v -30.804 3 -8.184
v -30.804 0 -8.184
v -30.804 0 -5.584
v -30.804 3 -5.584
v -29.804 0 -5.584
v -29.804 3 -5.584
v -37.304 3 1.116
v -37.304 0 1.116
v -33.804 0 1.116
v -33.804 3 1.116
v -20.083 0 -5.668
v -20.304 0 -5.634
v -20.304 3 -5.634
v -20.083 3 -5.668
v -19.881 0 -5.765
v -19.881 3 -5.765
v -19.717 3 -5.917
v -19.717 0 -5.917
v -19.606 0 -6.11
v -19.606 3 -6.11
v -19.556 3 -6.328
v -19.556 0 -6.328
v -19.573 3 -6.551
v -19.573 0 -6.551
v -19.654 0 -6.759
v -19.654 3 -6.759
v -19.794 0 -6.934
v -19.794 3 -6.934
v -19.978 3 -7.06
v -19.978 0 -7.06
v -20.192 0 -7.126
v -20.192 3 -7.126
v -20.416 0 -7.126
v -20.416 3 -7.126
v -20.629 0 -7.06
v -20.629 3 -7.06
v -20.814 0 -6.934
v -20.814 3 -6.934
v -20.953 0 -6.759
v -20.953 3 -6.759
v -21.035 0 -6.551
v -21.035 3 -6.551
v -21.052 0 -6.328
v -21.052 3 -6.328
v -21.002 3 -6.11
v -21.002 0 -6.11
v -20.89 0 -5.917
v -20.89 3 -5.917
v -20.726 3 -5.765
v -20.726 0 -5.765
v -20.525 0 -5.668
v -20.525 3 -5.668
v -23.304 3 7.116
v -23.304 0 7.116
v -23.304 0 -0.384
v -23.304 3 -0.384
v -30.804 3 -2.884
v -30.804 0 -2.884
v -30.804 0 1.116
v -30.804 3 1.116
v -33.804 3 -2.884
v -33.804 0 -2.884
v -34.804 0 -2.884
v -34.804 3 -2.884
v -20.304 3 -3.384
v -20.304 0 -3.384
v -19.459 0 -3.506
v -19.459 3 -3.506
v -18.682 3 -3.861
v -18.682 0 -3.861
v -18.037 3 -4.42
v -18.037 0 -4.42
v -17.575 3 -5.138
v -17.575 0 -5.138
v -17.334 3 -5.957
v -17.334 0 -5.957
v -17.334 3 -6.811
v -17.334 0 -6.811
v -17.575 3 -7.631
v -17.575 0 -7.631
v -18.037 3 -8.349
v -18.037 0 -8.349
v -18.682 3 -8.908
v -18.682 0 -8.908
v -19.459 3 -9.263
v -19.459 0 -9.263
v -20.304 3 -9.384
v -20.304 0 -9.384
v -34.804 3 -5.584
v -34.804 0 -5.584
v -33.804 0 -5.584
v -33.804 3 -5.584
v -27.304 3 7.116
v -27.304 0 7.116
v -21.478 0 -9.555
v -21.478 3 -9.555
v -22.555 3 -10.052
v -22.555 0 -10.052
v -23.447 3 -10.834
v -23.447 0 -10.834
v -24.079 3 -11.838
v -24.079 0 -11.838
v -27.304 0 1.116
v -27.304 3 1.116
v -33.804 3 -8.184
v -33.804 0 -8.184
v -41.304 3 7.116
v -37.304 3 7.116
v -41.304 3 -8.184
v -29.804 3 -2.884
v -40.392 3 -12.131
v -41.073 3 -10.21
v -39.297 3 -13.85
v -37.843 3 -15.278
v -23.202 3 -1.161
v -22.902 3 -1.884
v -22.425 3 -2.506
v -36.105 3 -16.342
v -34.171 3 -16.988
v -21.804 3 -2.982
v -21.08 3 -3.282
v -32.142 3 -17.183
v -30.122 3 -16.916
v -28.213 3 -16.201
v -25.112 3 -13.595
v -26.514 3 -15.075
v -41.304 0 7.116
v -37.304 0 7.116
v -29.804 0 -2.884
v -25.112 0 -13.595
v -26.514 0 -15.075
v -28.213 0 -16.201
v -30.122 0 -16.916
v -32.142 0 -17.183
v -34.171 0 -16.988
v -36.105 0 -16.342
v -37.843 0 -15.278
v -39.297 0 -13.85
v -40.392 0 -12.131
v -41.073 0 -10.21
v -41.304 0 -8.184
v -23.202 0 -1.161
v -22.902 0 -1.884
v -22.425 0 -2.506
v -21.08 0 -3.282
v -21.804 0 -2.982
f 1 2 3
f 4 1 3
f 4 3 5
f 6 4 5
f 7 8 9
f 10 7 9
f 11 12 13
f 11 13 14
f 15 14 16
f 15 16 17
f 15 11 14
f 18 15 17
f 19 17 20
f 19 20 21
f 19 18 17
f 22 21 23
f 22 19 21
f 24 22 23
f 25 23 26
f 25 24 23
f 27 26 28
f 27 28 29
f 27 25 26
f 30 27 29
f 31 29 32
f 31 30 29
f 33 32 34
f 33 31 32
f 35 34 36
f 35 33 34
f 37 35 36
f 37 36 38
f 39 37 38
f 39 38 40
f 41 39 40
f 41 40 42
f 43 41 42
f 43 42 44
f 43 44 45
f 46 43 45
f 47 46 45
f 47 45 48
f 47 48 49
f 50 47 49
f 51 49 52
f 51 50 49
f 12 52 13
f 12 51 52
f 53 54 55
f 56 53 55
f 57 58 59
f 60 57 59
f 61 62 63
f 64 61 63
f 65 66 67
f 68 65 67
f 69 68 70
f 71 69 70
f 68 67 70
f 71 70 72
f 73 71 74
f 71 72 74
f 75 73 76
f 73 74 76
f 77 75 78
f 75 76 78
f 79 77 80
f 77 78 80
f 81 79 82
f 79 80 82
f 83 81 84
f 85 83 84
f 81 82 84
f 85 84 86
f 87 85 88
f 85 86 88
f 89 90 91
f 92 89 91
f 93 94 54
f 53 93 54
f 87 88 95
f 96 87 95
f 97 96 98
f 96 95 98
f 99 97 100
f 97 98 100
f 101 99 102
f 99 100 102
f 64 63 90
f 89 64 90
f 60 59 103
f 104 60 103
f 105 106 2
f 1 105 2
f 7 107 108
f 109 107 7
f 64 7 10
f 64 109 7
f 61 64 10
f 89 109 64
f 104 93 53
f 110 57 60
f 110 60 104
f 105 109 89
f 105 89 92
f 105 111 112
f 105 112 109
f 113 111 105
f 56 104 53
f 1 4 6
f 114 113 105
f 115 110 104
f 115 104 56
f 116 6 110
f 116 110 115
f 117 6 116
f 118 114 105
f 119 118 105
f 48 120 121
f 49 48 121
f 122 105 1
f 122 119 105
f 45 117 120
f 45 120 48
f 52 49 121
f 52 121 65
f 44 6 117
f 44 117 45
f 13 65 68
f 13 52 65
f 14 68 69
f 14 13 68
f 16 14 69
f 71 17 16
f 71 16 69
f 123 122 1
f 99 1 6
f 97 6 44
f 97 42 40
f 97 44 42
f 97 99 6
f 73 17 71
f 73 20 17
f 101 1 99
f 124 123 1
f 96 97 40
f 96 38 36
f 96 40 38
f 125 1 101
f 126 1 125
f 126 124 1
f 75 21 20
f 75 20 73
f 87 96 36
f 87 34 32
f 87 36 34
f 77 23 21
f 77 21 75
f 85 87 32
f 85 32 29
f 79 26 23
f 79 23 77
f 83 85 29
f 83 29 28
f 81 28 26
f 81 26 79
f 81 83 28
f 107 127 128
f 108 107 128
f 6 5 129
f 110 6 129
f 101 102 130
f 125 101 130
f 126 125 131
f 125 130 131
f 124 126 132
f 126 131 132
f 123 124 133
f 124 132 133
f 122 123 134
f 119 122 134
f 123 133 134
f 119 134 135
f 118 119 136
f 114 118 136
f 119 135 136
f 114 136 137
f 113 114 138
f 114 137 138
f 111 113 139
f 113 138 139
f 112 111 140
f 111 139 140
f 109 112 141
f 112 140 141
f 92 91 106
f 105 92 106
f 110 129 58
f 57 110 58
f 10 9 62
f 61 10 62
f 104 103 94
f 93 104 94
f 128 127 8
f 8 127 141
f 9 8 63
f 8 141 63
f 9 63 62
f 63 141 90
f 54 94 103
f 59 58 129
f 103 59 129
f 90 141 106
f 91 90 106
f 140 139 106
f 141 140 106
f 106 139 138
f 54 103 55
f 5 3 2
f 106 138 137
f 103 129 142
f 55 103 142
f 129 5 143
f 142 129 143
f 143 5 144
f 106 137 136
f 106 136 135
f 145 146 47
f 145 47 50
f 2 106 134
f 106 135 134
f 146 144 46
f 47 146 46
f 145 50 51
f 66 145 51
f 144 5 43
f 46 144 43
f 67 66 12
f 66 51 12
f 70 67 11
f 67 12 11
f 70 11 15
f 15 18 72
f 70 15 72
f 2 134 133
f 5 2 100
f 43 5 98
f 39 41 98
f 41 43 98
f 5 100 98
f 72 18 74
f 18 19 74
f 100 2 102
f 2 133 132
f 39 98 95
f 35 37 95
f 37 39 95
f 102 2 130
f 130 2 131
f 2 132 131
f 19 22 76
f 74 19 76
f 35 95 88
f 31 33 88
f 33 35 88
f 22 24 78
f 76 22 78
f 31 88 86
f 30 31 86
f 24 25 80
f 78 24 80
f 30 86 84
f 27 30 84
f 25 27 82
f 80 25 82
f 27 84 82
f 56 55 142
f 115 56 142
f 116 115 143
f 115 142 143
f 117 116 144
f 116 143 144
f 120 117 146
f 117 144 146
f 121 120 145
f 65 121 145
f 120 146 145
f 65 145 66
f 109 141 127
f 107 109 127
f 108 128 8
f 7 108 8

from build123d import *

# Parameters (mm, degrees)
SKETCH_1_R      = 0.75
EXTRUDE_1_DEPTH = 3


with BuildPart() as part:
    # 草图1 → 凸台-拉伸1 (new body)
    with BuildSketch(Plane(origin=(0, 0, 0), x_dir=(1, 0, 0), z_dir=(0, 1, 0))):
        with BuildLine():
            Line((-41.303773208, 8.184389917), (-41.303773208, -7.115610083))
            Line((-41.303773208, -7.115610083), (-37.303773208, -7.115610083))
            Line((-37.303773208, -7.115610083), (-37.303773208, -1.115610083))
            Line((-37.303773208, -1.115610083), (-33.803773208, -1.115610083))
            Line((-33.803773208, -1.115610083), (-33.803773208, 2.884389917))
            Line((-33.803773208, 2.884389917), (-34.803773208, 2.884389917))
            Line((-34.803773208, 2.884389917), (-34.803773208, 5.584389917))
            Line((-34.803773208, 5.584389917), (-33.803773208, 5.584389917))
            Line((-33.803773208, 5.584389917), (-33.803773208, 8.184389917))
            Line((-33.803773208, 8.184389917), (-30.803773208, 8.184389917))
            Line((-30.803773208, 8.184389917), (-30.803773208, 5.584389917))
            Line((-30.803773208, 5.584389917), (-29.803773208, 5.584389917))
            Line((-29.803773208, 5.584389917), (-29.803773208, 2.884389917))
            Line((-29.803773208, 2.884389917), (-30.803773208, 2.884389917))
            Line((-30.803773208, 2.884389917), (-30.803773208, -1.115610083))
            Line((-30.803773208, -1.115610083), (-27.303773208, -1.115610083))
            Line((-27.303773208, -1.115610083), (-27.303773208, -7.115610083))
            Line((-27.303773208, -7.115610083), (-23.303773208, -7.115610083))
            Line((-23.303773208, -7.115610083), (-23.303773208, 0.384389917))
            ThreePointArc((-23.303773208, 0.384389917), (-22.425093551, 2.505710261), (-20.303773208, 3.384389917))
            ThreePointArc((-20.303773208, 3.384389917), (-17.303773208, 6.384389917), (-20.303773208, 9.384389917))
            ThreePointArc((-20.303773208, 9.384389917), (-22.554994318, 10.051742056), (-24.078817144, 11.838168476))
            ThreePointArc((-24.078817144, 11.838168476), (-34.171311083, 16.988497043), (-41.303773208, 8.184389917))
        make_face()
        with Locations(Location((-20.303773208, 6.384389917, 0), (0, 0, 270))):
            Circle(SKETCH_1_R, mode=Mode.SUBTRACT)
    extrude(amount=EXTRUDE_1_DEPTH)


solid = part.part
